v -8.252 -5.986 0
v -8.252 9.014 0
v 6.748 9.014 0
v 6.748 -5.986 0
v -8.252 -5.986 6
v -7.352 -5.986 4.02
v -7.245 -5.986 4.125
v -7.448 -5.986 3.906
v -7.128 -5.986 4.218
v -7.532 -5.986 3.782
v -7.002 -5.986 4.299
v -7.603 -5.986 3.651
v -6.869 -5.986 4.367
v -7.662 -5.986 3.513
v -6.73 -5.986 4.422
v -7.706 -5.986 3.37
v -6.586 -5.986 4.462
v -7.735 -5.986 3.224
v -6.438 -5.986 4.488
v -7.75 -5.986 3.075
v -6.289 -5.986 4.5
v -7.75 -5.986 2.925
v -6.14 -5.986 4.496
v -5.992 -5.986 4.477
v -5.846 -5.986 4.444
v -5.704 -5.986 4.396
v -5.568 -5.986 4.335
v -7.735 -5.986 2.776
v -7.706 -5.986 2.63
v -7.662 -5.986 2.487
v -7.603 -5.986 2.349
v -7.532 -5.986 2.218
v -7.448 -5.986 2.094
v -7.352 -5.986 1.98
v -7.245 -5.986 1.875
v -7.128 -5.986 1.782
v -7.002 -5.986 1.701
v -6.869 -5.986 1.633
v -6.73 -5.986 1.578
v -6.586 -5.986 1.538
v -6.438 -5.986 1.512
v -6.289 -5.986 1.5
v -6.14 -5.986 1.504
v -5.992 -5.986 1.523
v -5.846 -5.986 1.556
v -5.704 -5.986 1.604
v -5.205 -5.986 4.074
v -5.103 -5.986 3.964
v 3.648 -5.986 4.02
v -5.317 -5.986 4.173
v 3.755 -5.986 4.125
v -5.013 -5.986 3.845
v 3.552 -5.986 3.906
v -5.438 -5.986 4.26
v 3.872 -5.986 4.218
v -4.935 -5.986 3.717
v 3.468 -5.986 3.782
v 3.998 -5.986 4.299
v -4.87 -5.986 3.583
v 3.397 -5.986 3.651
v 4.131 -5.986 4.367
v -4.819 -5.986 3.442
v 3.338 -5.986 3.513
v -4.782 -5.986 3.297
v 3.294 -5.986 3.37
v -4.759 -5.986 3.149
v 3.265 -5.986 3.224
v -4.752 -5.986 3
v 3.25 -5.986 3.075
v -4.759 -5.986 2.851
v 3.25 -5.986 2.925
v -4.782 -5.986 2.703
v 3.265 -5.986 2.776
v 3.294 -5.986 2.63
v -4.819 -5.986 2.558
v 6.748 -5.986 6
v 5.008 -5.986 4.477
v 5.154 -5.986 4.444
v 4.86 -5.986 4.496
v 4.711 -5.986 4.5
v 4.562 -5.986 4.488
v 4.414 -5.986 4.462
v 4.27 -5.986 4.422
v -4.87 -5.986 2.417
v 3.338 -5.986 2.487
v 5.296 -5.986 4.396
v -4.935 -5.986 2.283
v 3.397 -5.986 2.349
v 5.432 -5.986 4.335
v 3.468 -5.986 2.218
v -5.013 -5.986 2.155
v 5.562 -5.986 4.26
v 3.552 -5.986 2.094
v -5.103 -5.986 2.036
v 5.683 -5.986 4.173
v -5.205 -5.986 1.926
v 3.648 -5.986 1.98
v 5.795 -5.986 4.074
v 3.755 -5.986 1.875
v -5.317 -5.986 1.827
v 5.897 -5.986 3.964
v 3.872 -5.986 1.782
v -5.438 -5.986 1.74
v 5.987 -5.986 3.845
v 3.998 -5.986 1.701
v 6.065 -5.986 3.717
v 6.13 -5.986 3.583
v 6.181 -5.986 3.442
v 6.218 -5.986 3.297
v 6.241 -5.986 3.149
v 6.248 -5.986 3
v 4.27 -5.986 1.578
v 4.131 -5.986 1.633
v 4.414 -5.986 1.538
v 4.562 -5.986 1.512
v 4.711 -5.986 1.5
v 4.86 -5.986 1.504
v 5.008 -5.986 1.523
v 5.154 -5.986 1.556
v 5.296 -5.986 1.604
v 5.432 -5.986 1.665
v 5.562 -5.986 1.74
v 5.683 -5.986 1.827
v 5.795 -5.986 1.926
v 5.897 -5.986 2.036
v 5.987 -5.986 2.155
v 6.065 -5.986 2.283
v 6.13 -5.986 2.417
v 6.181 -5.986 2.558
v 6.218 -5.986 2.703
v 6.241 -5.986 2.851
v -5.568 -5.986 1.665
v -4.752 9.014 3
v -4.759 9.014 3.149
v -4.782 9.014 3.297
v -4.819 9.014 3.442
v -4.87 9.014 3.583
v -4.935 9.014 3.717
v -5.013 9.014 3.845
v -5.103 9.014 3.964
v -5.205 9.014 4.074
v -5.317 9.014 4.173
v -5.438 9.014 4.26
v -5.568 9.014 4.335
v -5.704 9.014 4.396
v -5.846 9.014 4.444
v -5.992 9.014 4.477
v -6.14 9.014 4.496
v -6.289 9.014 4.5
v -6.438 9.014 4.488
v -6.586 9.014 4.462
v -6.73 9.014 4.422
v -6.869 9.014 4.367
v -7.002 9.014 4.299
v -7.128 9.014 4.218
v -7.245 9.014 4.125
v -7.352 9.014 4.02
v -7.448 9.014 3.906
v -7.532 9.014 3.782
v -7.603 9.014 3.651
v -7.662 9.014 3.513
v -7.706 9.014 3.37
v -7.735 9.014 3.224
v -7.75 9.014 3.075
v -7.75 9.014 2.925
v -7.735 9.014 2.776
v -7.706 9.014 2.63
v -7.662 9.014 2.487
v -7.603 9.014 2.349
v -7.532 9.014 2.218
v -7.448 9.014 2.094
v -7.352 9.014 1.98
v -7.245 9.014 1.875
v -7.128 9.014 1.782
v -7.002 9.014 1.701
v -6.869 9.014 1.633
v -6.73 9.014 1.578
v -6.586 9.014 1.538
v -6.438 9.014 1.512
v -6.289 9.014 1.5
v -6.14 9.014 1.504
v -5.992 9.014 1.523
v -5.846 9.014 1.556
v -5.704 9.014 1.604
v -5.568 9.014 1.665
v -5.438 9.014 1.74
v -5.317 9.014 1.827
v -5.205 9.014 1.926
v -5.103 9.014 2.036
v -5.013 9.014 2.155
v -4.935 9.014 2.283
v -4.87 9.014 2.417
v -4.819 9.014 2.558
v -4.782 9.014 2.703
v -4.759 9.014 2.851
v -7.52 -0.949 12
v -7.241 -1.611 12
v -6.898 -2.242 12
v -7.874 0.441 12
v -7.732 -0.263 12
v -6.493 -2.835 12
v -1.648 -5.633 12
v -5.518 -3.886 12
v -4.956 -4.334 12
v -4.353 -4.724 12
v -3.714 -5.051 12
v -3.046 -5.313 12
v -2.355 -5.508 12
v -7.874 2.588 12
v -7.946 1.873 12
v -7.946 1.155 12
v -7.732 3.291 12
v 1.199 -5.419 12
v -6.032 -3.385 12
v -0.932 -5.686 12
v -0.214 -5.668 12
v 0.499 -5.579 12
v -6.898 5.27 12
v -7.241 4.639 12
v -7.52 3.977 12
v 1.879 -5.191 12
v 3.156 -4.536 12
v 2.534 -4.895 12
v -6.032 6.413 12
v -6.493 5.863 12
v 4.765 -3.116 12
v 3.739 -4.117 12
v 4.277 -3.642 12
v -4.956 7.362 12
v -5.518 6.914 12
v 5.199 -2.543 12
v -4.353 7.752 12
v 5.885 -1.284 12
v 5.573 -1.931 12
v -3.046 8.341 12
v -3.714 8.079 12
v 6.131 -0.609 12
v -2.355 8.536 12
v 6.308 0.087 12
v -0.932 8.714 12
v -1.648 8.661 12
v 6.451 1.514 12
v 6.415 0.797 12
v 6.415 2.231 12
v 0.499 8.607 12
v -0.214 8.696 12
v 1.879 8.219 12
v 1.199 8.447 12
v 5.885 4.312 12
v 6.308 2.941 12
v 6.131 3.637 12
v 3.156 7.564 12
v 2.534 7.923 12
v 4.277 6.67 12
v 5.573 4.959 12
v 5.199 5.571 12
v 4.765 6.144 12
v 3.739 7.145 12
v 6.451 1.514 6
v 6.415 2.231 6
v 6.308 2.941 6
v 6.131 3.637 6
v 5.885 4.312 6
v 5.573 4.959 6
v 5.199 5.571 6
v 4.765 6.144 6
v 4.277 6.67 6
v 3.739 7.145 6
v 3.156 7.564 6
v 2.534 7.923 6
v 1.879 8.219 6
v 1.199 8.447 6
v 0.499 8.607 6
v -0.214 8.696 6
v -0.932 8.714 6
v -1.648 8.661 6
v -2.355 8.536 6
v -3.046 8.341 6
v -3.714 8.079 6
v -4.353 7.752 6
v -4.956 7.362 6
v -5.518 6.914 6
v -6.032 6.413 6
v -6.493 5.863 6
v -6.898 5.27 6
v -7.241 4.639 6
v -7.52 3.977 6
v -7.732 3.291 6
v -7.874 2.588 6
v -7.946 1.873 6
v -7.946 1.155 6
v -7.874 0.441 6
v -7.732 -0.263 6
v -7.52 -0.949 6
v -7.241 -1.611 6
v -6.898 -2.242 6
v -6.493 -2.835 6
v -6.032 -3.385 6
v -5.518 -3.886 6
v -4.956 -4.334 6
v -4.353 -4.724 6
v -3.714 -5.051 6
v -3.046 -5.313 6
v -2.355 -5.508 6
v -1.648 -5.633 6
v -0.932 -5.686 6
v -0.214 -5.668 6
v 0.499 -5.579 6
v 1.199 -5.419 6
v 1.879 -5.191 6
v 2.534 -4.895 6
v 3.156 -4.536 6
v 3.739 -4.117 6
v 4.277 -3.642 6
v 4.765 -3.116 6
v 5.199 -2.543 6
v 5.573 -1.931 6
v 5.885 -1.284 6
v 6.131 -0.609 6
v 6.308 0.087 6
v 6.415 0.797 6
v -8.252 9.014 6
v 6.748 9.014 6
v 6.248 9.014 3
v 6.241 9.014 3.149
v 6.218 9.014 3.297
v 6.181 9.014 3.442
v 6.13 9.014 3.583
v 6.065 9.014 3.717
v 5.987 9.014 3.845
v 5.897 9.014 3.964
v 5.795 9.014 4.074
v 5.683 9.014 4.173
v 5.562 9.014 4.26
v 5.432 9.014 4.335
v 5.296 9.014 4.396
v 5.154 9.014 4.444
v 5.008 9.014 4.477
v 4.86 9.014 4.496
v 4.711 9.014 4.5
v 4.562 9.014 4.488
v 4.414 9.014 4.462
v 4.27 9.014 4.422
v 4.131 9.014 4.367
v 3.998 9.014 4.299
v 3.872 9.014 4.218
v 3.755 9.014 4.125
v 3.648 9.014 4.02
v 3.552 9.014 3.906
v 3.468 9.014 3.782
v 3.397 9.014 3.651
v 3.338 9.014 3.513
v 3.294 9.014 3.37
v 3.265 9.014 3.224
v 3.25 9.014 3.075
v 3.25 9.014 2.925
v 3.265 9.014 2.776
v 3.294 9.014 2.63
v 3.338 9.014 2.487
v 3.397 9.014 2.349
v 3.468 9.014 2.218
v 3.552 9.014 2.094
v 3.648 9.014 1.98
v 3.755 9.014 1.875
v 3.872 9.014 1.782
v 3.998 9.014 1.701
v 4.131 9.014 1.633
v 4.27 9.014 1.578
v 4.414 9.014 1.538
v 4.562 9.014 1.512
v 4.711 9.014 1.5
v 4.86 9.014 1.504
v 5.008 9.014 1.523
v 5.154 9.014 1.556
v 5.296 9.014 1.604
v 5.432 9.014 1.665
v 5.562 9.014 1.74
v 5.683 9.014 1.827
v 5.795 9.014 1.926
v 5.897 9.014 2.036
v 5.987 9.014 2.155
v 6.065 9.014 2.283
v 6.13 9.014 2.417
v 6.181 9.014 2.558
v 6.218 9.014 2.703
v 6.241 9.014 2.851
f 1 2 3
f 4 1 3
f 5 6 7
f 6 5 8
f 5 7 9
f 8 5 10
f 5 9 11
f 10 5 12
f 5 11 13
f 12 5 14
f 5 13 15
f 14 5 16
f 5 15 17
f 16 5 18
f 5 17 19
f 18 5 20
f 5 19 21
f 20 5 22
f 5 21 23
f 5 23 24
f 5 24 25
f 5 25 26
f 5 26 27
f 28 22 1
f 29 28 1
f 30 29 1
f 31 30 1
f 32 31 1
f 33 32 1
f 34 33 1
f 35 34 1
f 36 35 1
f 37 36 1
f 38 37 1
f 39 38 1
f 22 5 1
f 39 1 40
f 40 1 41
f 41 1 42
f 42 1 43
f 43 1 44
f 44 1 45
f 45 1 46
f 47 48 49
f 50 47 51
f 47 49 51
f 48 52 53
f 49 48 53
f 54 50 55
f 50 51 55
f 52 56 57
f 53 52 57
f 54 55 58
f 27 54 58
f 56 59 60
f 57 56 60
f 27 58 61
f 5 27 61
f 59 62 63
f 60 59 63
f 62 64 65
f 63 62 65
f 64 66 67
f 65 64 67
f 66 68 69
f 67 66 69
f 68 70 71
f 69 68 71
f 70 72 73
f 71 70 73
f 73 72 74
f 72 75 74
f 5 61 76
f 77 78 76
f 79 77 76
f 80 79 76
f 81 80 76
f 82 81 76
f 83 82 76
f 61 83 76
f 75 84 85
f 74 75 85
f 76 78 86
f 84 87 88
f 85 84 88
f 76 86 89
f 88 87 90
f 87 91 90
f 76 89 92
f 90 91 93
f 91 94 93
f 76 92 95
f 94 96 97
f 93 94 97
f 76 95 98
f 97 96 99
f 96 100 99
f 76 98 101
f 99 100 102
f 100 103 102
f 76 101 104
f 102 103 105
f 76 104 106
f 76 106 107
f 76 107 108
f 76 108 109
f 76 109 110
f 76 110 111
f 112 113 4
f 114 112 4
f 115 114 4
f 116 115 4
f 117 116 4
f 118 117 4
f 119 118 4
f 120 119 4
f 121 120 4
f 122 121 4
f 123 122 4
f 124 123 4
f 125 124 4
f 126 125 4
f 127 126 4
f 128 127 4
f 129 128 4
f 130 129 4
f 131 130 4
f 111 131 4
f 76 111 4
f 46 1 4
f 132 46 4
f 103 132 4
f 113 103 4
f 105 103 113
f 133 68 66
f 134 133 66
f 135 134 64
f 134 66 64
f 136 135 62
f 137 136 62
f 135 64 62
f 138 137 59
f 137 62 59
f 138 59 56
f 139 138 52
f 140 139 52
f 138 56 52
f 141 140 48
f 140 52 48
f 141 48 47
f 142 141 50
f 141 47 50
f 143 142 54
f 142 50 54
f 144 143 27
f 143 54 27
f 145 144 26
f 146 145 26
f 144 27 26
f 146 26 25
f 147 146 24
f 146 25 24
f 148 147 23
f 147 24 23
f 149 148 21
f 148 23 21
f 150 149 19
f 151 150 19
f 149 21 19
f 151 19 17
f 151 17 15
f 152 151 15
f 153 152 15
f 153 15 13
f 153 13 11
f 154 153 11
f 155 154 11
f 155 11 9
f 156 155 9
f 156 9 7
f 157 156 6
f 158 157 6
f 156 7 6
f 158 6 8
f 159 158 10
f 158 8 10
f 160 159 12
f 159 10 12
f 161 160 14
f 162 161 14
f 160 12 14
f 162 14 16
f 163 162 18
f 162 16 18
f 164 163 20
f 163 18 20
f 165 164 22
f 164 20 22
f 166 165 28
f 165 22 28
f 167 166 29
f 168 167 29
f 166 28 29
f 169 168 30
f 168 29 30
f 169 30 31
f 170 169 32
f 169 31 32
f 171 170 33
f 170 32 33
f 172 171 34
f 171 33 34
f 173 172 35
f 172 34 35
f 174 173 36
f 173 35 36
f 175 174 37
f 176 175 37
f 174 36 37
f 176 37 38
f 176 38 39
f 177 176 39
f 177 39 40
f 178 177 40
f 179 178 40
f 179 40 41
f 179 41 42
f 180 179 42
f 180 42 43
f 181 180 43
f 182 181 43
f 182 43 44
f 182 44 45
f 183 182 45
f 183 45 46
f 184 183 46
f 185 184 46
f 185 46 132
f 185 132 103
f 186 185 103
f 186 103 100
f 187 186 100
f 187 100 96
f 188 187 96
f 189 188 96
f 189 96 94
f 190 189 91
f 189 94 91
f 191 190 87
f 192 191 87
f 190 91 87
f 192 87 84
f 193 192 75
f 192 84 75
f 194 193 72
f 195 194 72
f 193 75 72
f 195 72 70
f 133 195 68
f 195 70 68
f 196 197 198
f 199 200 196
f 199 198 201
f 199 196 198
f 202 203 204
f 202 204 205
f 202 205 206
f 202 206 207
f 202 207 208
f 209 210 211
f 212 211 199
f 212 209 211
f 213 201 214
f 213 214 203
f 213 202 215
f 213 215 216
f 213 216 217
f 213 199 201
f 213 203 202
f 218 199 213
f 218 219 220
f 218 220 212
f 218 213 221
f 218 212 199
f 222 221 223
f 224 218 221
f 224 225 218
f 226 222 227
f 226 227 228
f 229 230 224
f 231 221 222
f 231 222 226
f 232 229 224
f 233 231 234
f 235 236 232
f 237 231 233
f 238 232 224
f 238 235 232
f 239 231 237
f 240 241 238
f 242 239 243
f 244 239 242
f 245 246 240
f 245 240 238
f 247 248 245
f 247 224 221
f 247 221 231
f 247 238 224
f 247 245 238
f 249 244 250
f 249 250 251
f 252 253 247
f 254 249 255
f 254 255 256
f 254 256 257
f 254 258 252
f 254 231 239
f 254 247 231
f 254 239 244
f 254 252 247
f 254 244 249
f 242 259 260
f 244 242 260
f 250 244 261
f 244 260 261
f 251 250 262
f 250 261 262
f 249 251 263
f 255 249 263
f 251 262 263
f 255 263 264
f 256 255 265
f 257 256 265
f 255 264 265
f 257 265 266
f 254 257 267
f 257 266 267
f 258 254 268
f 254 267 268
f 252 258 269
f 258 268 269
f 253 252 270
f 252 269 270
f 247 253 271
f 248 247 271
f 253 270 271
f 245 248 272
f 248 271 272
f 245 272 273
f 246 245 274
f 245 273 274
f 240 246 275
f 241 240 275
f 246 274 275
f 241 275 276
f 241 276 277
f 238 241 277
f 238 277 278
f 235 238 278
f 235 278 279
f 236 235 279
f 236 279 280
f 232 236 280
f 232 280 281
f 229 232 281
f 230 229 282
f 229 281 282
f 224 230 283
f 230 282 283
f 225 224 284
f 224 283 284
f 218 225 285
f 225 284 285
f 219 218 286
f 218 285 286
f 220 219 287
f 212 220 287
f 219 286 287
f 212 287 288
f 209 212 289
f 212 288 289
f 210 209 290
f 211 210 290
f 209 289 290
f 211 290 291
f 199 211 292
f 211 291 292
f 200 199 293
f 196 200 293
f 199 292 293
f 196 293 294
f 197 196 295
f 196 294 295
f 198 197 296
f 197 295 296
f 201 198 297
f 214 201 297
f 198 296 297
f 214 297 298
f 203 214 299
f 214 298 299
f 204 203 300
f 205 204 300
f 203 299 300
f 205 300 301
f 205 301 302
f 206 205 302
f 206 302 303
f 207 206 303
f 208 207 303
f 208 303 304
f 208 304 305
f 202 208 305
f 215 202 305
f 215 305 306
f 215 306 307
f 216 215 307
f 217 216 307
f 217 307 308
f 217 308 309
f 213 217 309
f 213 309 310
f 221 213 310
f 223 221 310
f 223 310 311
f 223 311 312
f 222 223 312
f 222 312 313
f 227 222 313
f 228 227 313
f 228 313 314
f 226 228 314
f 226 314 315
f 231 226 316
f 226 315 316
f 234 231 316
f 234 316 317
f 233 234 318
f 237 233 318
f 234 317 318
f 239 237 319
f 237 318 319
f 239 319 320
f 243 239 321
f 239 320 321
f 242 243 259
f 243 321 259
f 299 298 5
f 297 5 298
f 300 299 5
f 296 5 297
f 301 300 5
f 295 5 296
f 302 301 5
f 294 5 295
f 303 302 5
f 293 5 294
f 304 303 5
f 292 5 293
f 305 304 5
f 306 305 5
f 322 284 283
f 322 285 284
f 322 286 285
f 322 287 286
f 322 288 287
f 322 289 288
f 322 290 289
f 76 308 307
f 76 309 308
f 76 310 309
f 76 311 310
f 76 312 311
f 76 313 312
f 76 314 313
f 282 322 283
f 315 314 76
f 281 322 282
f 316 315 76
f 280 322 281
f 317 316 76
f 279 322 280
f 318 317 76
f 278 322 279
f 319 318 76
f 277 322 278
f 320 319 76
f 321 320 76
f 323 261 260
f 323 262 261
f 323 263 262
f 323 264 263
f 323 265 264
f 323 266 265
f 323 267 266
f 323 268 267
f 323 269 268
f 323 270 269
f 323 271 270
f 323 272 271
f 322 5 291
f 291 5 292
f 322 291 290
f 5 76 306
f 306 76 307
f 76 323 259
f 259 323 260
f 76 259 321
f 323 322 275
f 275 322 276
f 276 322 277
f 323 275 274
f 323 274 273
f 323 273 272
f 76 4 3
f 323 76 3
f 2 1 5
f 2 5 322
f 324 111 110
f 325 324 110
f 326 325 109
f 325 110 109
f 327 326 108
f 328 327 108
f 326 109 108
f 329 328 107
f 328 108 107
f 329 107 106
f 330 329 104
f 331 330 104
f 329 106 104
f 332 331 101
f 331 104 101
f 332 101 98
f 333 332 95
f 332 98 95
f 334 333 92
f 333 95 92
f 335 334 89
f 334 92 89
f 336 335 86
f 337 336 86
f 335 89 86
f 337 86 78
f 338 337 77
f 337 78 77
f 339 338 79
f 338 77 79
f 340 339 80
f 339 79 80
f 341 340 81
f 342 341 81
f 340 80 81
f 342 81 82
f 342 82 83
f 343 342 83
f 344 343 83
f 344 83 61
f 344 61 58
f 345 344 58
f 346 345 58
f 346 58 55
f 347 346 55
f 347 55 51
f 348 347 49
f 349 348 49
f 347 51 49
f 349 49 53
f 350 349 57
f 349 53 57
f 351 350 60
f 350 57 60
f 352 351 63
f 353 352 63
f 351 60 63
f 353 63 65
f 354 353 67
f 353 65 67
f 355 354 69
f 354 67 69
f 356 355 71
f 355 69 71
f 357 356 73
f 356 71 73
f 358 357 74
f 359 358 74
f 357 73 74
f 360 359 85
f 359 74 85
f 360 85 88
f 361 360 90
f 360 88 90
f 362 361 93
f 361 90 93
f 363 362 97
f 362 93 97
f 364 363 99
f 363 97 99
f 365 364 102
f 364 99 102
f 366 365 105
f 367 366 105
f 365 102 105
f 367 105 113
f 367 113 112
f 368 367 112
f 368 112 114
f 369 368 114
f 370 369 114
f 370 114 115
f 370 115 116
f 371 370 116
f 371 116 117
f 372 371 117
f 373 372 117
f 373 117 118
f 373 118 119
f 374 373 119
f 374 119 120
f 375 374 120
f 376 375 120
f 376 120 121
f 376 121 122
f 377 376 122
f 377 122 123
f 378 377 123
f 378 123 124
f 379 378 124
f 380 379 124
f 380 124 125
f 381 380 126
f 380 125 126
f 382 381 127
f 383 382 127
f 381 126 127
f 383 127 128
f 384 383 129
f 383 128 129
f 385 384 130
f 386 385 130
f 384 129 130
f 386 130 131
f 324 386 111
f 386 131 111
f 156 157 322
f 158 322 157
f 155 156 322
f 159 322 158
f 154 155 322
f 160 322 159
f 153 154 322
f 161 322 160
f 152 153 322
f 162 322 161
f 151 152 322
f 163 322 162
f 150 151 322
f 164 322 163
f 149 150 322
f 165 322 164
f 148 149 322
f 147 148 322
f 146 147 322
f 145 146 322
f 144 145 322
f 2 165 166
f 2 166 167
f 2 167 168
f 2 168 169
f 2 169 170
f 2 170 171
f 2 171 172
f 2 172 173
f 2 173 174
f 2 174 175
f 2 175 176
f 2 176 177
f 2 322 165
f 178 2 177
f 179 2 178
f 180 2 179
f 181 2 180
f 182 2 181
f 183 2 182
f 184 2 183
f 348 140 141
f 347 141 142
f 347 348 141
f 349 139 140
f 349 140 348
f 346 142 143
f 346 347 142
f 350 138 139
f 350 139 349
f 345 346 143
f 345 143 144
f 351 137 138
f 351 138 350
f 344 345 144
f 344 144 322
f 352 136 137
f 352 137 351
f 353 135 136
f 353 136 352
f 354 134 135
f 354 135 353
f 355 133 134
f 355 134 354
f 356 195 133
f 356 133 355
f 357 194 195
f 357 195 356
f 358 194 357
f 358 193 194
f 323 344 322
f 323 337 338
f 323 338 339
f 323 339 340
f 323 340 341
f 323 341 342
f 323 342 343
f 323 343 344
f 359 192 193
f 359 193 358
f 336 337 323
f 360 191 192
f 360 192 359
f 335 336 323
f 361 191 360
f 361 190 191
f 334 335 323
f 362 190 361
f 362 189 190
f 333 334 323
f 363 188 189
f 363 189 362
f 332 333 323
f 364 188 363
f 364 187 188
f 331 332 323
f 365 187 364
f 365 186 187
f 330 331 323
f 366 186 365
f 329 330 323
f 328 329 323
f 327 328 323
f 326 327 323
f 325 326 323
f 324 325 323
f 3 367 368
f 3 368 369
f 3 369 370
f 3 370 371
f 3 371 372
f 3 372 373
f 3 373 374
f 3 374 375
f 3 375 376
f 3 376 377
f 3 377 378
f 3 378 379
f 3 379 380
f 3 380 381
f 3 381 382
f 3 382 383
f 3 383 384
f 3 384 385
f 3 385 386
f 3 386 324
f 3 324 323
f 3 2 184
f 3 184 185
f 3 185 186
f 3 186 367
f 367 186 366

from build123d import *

# Parameters (mm, degrees)
F0_W     = 15
F0_H     = 15
F1_DEPTH = 6
F2_R     = 1.5
F3_DEPTH = 15
F4_R     = 1.5
F5_DEPTH = 15
F6_R     = 7.202484
F7_DEPTH = 6


with BuildPart() as f1:
    # F0 (on Top) → F1 (new body)
    with BuildSketch(Plane.XY):
        with Locations((-0.751974, 1.514031)):
            Rectangle(F0_W, F0_H)
    extrude(amount=F1_DEPTH)

    # F2 (on face) → F3 (cut)
    with BuildSketch(Plane.XZ.offset(5.985969)):
        with Locations((-6.251974, 3)):
            Circle(F2_R)
    extrude(amount=-F3_DEPTH, mode=Mode.SUBTRACT)

    # F4 (on face) → F5 (cut)
    with BuildSketch(Plane.XZ.offset(5.985969)):
        with Locations((4.748026, 3)):
            Circle(F4_R)
    extrude(amount=-F5_DEPTH, mode=Mode.SUBTRACT)

    # F6 (on face) → F7 (join)
    with BuildSketch(Plane.XY.offset(6)):
        with Locations((-0.751974, 1.514031)):
            Circle(F6_R)
    extrude(amount=F7_DEPTH)


solid = f1.part
